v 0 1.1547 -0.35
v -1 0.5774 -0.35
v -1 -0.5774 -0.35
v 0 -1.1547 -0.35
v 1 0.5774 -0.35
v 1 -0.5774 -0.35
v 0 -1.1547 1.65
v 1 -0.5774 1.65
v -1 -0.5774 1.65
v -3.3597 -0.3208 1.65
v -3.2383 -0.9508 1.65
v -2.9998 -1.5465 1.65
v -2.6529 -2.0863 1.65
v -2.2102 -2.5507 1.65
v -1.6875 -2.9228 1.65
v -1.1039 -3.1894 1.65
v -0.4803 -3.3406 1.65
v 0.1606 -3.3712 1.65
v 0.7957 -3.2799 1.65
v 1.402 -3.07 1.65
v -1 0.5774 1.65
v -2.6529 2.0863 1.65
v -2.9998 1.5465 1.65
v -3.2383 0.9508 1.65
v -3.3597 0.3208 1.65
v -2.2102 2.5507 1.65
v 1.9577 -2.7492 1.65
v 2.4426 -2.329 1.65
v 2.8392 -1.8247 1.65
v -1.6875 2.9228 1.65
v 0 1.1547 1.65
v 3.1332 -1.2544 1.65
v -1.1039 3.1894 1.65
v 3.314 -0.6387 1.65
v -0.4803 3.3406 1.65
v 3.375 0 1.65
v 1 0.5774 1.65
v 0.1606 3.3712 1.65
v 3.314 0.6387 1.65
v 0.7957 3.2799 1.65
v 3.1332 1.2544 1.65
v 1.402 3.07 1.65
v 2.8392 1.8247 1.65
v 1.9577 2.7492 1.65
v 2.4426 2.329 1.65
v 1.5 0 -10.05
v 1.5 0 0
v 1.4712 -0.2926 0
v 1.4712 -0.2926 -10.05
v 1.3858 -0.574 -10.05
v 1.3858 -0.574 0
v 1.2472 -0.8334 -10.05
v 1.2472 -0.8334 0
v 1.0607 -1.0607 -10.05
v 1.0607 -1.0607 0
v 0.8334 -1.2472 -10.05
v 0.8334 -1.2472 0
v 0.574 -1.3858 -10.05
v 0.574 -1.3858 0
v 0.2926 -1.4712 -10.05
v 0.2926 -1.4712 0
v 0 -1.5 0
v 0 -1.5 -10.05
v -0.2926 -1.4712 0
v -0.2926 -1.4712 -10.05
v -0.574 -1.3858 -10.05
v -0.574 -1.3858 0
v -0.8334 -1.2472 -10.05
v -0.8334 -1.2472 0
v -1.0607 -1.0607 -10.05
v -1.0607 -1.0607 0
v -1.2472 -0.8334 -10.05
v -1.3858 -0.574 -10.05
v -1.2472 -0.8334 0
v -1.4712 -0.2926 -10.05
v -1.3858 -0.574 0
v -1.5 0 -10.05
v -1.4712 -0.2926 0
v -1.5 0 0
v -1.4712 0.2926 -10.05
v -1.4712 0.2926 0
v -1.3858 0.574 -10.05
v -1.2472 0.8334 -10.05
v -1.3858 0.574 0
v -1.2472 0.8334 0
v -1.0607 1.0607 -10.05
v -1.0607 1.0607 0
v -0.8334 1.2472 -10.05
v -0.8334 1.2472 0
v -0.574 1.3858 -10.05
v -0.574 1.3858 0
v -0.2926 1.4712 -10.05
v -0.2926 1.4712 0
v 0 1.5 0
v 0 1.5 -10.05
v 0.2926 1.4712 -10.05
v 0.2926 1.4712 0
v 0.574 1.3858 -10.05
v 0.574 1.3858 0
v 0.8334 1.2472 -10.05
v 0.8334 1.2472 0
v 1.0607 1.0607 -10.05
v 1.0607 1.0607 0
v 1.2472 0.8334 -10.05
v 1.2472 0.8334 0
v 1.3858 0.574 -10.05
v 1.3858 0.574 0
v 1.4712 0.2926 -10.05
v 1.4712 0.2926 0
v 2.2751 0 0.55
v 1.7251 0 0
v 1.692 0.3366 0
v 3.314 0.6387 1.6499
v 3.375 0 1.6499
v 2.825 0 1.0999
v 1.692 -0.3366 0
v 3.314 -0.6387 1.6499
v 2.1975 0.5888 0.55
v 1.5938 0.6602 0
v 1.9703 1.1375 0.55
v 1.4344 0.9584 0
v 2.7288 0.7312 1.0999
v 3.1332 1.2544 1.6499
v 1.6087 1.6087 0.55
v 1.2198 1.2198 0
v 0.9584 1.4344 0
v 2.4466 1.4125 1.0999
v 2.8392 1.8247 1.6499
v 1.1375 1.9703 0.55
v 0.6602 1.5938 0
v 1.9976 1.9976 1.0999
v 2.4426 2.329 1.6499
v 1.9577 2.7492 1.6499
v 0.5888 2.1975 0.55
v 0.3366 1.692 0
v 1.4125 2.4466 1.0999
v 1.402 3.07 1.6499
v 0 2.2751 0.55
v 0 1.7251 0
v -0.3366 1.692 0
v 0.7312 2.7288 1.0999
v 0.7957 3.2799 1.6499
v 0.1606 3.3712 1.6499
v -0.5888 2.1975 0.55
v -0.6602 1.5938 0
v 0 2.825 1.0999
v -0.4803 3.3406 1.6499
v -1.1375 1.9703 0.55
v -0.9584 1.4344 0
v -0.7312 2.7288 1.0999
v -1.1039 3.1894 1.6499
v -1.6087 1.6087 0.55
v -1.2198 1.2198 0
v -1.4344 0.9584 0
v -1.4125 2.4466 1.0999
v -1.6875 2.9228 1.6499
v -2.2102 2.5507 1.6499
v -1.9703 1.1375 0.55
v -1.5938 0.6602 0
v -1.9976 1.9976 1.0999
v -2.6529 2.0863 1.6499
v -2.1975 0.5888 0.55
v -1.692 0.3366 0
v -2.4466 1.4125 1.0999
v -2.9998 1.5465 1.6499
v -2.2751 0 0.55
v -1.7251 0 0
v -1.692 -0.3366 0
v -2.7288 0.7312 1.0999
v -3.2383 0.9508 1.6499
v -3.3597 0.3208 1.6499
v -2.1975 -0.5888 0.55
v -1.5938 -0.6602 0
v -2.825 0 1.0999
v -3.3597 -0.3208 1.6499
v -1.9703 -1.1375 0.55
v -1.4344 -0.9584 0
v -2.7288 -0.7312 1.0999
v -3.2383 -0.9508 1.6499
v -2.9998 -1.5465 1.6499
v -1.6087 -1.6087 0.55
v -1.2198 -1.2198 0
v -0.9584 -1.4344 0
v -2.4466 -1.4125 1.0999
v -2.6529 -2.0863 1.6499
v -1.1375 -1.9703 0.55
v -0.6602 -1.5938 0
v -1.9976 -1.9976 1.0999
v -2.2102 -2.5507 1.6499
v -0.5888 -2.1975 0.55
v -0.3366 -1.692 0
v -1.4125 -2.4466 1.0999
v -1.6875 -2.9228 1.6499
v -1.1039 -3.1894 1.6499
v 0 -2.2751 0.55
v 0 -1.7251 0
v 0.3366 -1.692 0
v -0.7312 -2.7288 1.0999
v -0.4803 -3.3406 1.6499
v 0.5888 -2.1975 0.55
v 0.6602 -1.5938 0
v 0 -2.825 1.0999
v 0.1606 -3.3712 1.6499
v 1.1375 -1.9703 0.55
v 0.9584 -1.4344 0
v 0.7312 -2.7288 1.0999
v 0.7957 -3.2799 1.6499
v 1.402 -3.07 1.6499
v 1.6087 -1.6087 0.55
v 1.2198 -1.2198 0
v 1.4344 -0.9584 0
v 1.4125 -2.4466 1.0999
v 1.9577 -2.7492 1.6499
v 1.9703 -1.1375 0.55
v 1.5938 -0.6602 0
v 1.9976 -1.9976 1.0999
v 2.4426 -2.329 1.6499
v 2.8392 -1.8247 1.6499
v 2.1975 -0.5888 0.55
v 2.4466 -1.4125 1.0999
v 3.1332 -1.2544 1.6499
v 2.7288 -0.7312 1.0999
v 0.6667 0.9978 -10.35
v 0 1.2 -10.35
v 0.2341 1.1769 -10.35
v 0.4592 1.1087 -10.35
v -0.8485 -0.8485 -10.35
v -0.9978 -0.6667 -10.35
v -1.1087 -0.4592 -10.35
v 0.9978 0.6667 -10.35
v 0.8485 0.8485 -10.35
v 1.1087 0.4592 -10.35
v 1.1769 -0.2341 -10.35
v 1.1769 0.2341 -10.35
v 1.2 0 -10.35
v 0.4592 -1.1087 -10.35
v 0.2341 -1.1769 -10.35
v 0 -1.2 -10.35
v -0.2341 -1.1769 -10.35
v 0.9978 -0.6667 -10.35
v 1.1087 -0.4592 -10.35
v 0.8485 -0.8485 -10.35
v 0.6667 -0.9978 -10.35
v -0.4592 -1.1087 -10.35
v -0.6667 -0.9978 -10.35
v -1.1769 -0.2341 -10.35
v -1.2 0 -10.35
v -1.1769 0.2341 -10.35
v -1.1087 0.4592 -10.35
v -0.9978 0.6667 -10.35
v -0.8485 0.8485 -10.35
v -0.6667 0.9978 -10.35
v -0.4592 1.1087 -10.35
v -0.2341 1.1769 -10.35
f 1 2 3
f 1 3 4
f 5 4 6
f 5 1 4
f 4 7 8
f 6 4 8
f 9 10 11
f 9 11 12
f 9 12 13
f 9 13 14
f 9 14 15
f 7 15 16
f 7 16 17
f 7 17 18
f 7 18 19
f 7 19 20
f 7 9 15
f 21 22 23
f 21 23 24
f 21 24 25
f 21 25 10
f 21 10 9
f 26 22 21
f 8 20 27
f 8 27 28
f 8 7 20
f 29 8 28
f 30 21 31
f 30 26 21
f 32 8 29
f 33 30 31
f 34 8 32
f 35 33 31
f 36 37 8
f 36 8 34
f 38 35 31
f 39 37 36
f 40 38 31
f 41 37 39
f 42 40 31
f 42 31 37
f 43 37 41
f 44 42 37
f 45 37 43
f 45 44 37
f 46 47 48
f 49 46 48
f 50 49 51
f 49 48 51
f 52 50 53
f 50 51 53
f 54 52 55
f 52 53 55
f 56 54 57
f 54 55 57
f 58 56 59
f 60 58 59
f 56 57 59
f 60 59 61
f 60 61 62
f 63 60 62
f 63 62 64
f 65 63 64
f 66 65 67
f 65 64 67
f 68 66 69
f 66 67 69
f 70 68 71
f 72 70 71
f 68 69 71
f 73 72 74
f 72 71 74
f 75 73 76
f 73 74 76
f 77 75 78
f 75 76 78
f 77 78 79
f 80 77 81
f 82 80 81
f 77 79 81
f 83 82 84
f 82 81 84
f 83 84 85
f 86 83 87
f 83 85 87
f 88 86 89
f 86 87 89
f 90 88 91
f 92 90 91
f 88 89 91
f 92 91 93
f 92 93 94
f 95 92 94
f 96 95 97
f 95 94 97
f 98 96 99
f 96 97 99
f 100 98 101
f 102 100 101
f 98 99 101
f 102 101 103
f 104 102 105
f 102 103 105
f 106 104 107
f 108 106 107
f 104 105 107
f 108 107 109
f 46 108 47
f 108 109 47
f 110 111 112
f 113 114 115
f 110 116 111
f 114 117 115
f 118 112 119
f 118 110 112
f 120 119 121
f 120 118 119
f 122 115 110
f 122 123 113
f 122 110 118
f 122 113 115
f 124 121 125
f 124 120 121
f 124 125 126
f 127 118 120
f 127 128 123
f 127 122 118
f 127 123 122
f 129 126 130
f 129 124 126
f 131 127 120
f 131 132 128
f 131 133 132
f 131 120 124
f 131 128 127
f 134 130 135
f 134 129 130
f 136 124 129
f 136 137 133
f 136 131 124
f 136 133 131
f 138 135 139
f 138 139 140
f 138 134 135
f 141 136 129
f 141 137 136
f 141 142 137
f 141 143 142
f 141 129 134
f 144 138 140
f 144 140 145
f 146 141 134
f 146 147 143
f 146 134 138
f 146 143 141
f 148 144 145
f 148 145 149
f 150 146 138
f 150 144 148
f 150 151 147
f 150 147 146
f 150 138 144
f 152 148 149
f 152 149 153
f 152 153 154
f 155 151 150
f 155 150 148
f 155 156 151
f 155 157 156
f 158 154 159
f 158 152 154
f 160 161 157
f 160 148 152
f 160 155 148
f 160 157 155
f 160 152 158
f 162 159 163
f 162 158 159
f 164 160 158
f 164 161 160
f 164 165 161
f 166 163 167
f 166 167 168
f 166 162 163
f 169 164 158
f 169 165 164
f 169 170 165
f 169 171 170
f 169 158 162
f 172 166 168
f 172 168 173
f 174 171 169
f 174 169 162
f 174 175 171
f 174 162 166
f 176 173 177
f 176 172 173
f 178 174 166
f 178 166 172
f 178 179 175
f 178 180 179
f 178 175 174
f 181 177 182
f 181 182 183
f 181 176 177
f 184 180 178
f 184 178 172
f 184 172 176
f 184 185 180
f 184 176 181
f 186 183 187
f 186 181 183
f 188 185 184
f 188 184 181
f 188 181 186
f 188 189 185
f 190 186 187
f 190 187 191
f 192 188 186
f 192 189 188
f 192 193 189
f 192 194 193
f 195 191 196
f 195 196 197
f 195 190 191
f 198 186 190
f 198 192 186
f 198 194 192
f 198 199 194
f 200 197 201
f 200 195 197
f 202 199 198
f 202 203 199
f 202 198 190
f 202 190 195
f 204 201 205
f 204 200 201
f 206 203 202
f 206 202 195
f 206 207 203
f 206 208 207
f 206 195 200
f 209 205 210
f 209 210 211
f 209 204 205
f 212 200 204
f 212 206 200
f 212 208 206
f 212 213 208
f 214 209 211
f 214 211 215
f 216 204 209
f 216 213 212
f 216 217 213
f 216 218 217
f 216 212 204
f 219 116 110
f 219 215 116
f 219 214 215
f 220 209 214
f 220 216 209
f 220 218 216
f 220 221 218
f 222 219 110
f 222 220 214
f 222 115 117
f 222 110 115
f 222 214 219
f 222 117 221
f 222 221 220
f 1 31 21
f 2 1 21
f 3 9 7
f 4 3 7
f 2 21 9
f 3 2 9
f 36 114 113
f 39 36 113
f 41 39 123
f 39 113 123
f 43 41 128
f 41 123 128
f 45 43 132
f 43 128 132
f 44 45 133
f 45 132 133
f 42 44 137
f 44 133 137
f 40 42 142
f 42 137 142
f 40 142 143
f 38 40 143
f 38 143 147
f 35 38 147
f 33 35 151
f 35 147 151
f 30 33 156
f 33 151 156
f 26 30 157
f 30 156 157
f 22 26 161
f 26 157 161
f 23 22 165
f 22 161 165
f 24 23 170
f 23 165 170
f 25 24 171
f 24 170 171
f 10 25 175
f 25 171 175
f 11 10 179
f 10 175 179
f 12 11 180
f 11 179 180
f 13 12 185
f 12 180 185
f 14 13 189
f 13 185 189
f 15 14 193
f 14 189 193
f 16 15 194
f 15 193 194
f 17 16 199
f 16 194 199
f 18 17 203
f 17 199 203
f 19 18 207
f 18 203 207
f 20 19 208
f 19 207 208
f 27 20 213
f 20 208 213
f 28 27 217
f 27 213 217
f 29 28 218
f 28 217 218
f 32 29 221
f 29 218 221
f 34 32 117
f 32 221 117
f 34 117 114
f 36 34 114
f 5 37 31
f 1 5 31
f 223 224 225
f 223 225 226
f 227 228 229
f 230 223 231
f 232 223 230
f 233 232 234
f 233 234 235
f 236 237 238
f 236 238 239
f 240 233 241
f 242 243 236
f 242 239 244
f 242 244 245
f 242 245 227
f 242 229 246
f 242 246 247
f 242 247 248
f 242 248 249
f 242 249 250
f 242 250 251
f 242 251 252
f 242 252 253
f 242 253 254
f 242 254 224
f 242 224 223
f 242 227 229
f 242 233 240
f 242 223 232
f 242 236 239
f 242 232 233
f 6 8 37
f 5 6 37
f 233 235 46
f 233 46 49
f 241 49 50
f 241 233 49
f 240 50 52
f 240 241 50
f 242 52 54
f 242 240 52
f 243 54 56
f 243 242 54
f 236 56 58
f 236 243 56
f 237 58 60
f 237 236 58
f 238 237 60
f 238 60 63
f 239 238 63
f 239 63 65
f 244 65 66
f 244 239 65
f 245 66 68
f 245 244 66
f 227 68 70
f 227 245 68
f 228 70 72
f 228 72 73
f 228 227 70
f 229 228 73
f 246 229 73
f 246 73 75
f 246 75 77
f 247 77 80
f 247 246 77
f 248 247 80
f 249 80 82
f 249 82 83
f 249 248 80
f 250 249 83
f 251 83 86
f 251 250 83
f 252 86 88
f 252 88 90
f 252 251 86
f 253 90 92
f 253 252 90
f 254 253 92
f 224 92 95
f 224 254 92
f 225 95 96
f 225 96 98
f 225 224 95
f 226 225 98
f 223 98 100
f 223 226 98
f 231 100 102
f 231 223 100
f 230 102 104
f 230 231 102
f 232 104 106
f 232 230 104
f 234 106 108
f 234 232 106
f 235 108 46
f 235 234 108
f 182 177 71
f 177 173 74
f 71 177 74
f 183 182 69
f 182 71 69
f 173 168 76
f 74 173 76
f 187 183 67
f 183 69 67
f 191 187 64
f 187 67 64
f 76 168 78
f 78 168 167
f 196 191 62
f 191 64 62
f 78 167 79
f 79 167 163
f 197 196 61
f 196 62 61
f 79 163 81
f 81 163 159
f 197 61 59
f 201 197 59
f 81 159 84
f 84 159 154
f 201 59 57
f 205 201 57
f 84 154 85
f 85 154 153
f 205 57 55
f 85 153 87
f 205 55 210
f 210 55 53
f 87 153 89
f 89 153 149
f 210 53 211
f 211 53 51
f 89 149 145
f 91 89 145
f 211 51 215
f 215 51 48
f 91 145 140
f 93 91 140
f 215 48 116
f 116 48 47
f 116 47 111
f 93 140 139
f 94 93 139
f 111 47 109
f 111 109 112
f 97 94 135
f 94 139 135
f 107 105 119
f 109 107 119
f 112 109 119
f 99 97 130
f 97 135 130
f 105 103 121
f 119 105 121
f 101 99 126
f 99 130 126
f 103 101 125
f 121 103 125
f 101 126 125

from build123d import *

# Parameters (mm, degrees)
SKETCH1_R           = 3.375
BOSS_EXTRUDE1_DEPTH = 1.65
SKETCH2_R           = 1.5
BOSS_EXTRUDE2_DEPTH = 10.35
CHAMFER1_SIZE       = 0.3
CUT_EXTRUDE1_DEPTH  = 2
CHAMFER2_SIZE       = 1.65


with BuildPart() as part:
    # Sketch1 → Boss-Extrude1 (new body)
    with BuildSketch(Plane.XY):
        Circle(SKETCH1_R)
    extrude(amount=BOSS_EXTRUDE1_DEPTH)

    # Sketch2 → Boss-Extrude2 (add)
    with BuildSketch(Plane(origin=(0, 0, 0), x_dir=(-1, 0, 0), z_dir=(0, 0, -1))):
        with Locations(Location((0, 0, 0), (0, 0, 180))):
            Circle(SKETCH2_R)
    extrude(amount=BOSS_EXTRUDE2_DEPTH)

    # Chamfer1
    chamfer1_edges = [part.edges().sort_by_distance(p)[0] for p in [
        (-1.5, 0, -10.35),
    ]]
    chamfer(chamfer1_edges, length=CHAMFER1_SIZE)

    # Sketch3 → Cut-Extrude1 (cut)
    with BuildSketch(Plane.XY.offset(1.65)):
        Polygon((0, 1.154700538), (-1, 0.577350269), (-1, -0.577350269), (0, -1.154700538), (1, -0.577350269), (1, 0.577350269), align=None)
    extrude(amount=-CUT_EXTRUDE1_DEPTH, mode=Mode.SUBTRACT)

    # Chamfer2
    chamfer2_edges = [part.edges().sort_by_distance(p)[0] for p in [
        (-3.375, 0, 0),
    ]]
    chamfer(chamfer2_edges, length=CHAMFER2_SIZE - 0.0001)  # a hair under: the kernel refuses the full size


solid = part.part
